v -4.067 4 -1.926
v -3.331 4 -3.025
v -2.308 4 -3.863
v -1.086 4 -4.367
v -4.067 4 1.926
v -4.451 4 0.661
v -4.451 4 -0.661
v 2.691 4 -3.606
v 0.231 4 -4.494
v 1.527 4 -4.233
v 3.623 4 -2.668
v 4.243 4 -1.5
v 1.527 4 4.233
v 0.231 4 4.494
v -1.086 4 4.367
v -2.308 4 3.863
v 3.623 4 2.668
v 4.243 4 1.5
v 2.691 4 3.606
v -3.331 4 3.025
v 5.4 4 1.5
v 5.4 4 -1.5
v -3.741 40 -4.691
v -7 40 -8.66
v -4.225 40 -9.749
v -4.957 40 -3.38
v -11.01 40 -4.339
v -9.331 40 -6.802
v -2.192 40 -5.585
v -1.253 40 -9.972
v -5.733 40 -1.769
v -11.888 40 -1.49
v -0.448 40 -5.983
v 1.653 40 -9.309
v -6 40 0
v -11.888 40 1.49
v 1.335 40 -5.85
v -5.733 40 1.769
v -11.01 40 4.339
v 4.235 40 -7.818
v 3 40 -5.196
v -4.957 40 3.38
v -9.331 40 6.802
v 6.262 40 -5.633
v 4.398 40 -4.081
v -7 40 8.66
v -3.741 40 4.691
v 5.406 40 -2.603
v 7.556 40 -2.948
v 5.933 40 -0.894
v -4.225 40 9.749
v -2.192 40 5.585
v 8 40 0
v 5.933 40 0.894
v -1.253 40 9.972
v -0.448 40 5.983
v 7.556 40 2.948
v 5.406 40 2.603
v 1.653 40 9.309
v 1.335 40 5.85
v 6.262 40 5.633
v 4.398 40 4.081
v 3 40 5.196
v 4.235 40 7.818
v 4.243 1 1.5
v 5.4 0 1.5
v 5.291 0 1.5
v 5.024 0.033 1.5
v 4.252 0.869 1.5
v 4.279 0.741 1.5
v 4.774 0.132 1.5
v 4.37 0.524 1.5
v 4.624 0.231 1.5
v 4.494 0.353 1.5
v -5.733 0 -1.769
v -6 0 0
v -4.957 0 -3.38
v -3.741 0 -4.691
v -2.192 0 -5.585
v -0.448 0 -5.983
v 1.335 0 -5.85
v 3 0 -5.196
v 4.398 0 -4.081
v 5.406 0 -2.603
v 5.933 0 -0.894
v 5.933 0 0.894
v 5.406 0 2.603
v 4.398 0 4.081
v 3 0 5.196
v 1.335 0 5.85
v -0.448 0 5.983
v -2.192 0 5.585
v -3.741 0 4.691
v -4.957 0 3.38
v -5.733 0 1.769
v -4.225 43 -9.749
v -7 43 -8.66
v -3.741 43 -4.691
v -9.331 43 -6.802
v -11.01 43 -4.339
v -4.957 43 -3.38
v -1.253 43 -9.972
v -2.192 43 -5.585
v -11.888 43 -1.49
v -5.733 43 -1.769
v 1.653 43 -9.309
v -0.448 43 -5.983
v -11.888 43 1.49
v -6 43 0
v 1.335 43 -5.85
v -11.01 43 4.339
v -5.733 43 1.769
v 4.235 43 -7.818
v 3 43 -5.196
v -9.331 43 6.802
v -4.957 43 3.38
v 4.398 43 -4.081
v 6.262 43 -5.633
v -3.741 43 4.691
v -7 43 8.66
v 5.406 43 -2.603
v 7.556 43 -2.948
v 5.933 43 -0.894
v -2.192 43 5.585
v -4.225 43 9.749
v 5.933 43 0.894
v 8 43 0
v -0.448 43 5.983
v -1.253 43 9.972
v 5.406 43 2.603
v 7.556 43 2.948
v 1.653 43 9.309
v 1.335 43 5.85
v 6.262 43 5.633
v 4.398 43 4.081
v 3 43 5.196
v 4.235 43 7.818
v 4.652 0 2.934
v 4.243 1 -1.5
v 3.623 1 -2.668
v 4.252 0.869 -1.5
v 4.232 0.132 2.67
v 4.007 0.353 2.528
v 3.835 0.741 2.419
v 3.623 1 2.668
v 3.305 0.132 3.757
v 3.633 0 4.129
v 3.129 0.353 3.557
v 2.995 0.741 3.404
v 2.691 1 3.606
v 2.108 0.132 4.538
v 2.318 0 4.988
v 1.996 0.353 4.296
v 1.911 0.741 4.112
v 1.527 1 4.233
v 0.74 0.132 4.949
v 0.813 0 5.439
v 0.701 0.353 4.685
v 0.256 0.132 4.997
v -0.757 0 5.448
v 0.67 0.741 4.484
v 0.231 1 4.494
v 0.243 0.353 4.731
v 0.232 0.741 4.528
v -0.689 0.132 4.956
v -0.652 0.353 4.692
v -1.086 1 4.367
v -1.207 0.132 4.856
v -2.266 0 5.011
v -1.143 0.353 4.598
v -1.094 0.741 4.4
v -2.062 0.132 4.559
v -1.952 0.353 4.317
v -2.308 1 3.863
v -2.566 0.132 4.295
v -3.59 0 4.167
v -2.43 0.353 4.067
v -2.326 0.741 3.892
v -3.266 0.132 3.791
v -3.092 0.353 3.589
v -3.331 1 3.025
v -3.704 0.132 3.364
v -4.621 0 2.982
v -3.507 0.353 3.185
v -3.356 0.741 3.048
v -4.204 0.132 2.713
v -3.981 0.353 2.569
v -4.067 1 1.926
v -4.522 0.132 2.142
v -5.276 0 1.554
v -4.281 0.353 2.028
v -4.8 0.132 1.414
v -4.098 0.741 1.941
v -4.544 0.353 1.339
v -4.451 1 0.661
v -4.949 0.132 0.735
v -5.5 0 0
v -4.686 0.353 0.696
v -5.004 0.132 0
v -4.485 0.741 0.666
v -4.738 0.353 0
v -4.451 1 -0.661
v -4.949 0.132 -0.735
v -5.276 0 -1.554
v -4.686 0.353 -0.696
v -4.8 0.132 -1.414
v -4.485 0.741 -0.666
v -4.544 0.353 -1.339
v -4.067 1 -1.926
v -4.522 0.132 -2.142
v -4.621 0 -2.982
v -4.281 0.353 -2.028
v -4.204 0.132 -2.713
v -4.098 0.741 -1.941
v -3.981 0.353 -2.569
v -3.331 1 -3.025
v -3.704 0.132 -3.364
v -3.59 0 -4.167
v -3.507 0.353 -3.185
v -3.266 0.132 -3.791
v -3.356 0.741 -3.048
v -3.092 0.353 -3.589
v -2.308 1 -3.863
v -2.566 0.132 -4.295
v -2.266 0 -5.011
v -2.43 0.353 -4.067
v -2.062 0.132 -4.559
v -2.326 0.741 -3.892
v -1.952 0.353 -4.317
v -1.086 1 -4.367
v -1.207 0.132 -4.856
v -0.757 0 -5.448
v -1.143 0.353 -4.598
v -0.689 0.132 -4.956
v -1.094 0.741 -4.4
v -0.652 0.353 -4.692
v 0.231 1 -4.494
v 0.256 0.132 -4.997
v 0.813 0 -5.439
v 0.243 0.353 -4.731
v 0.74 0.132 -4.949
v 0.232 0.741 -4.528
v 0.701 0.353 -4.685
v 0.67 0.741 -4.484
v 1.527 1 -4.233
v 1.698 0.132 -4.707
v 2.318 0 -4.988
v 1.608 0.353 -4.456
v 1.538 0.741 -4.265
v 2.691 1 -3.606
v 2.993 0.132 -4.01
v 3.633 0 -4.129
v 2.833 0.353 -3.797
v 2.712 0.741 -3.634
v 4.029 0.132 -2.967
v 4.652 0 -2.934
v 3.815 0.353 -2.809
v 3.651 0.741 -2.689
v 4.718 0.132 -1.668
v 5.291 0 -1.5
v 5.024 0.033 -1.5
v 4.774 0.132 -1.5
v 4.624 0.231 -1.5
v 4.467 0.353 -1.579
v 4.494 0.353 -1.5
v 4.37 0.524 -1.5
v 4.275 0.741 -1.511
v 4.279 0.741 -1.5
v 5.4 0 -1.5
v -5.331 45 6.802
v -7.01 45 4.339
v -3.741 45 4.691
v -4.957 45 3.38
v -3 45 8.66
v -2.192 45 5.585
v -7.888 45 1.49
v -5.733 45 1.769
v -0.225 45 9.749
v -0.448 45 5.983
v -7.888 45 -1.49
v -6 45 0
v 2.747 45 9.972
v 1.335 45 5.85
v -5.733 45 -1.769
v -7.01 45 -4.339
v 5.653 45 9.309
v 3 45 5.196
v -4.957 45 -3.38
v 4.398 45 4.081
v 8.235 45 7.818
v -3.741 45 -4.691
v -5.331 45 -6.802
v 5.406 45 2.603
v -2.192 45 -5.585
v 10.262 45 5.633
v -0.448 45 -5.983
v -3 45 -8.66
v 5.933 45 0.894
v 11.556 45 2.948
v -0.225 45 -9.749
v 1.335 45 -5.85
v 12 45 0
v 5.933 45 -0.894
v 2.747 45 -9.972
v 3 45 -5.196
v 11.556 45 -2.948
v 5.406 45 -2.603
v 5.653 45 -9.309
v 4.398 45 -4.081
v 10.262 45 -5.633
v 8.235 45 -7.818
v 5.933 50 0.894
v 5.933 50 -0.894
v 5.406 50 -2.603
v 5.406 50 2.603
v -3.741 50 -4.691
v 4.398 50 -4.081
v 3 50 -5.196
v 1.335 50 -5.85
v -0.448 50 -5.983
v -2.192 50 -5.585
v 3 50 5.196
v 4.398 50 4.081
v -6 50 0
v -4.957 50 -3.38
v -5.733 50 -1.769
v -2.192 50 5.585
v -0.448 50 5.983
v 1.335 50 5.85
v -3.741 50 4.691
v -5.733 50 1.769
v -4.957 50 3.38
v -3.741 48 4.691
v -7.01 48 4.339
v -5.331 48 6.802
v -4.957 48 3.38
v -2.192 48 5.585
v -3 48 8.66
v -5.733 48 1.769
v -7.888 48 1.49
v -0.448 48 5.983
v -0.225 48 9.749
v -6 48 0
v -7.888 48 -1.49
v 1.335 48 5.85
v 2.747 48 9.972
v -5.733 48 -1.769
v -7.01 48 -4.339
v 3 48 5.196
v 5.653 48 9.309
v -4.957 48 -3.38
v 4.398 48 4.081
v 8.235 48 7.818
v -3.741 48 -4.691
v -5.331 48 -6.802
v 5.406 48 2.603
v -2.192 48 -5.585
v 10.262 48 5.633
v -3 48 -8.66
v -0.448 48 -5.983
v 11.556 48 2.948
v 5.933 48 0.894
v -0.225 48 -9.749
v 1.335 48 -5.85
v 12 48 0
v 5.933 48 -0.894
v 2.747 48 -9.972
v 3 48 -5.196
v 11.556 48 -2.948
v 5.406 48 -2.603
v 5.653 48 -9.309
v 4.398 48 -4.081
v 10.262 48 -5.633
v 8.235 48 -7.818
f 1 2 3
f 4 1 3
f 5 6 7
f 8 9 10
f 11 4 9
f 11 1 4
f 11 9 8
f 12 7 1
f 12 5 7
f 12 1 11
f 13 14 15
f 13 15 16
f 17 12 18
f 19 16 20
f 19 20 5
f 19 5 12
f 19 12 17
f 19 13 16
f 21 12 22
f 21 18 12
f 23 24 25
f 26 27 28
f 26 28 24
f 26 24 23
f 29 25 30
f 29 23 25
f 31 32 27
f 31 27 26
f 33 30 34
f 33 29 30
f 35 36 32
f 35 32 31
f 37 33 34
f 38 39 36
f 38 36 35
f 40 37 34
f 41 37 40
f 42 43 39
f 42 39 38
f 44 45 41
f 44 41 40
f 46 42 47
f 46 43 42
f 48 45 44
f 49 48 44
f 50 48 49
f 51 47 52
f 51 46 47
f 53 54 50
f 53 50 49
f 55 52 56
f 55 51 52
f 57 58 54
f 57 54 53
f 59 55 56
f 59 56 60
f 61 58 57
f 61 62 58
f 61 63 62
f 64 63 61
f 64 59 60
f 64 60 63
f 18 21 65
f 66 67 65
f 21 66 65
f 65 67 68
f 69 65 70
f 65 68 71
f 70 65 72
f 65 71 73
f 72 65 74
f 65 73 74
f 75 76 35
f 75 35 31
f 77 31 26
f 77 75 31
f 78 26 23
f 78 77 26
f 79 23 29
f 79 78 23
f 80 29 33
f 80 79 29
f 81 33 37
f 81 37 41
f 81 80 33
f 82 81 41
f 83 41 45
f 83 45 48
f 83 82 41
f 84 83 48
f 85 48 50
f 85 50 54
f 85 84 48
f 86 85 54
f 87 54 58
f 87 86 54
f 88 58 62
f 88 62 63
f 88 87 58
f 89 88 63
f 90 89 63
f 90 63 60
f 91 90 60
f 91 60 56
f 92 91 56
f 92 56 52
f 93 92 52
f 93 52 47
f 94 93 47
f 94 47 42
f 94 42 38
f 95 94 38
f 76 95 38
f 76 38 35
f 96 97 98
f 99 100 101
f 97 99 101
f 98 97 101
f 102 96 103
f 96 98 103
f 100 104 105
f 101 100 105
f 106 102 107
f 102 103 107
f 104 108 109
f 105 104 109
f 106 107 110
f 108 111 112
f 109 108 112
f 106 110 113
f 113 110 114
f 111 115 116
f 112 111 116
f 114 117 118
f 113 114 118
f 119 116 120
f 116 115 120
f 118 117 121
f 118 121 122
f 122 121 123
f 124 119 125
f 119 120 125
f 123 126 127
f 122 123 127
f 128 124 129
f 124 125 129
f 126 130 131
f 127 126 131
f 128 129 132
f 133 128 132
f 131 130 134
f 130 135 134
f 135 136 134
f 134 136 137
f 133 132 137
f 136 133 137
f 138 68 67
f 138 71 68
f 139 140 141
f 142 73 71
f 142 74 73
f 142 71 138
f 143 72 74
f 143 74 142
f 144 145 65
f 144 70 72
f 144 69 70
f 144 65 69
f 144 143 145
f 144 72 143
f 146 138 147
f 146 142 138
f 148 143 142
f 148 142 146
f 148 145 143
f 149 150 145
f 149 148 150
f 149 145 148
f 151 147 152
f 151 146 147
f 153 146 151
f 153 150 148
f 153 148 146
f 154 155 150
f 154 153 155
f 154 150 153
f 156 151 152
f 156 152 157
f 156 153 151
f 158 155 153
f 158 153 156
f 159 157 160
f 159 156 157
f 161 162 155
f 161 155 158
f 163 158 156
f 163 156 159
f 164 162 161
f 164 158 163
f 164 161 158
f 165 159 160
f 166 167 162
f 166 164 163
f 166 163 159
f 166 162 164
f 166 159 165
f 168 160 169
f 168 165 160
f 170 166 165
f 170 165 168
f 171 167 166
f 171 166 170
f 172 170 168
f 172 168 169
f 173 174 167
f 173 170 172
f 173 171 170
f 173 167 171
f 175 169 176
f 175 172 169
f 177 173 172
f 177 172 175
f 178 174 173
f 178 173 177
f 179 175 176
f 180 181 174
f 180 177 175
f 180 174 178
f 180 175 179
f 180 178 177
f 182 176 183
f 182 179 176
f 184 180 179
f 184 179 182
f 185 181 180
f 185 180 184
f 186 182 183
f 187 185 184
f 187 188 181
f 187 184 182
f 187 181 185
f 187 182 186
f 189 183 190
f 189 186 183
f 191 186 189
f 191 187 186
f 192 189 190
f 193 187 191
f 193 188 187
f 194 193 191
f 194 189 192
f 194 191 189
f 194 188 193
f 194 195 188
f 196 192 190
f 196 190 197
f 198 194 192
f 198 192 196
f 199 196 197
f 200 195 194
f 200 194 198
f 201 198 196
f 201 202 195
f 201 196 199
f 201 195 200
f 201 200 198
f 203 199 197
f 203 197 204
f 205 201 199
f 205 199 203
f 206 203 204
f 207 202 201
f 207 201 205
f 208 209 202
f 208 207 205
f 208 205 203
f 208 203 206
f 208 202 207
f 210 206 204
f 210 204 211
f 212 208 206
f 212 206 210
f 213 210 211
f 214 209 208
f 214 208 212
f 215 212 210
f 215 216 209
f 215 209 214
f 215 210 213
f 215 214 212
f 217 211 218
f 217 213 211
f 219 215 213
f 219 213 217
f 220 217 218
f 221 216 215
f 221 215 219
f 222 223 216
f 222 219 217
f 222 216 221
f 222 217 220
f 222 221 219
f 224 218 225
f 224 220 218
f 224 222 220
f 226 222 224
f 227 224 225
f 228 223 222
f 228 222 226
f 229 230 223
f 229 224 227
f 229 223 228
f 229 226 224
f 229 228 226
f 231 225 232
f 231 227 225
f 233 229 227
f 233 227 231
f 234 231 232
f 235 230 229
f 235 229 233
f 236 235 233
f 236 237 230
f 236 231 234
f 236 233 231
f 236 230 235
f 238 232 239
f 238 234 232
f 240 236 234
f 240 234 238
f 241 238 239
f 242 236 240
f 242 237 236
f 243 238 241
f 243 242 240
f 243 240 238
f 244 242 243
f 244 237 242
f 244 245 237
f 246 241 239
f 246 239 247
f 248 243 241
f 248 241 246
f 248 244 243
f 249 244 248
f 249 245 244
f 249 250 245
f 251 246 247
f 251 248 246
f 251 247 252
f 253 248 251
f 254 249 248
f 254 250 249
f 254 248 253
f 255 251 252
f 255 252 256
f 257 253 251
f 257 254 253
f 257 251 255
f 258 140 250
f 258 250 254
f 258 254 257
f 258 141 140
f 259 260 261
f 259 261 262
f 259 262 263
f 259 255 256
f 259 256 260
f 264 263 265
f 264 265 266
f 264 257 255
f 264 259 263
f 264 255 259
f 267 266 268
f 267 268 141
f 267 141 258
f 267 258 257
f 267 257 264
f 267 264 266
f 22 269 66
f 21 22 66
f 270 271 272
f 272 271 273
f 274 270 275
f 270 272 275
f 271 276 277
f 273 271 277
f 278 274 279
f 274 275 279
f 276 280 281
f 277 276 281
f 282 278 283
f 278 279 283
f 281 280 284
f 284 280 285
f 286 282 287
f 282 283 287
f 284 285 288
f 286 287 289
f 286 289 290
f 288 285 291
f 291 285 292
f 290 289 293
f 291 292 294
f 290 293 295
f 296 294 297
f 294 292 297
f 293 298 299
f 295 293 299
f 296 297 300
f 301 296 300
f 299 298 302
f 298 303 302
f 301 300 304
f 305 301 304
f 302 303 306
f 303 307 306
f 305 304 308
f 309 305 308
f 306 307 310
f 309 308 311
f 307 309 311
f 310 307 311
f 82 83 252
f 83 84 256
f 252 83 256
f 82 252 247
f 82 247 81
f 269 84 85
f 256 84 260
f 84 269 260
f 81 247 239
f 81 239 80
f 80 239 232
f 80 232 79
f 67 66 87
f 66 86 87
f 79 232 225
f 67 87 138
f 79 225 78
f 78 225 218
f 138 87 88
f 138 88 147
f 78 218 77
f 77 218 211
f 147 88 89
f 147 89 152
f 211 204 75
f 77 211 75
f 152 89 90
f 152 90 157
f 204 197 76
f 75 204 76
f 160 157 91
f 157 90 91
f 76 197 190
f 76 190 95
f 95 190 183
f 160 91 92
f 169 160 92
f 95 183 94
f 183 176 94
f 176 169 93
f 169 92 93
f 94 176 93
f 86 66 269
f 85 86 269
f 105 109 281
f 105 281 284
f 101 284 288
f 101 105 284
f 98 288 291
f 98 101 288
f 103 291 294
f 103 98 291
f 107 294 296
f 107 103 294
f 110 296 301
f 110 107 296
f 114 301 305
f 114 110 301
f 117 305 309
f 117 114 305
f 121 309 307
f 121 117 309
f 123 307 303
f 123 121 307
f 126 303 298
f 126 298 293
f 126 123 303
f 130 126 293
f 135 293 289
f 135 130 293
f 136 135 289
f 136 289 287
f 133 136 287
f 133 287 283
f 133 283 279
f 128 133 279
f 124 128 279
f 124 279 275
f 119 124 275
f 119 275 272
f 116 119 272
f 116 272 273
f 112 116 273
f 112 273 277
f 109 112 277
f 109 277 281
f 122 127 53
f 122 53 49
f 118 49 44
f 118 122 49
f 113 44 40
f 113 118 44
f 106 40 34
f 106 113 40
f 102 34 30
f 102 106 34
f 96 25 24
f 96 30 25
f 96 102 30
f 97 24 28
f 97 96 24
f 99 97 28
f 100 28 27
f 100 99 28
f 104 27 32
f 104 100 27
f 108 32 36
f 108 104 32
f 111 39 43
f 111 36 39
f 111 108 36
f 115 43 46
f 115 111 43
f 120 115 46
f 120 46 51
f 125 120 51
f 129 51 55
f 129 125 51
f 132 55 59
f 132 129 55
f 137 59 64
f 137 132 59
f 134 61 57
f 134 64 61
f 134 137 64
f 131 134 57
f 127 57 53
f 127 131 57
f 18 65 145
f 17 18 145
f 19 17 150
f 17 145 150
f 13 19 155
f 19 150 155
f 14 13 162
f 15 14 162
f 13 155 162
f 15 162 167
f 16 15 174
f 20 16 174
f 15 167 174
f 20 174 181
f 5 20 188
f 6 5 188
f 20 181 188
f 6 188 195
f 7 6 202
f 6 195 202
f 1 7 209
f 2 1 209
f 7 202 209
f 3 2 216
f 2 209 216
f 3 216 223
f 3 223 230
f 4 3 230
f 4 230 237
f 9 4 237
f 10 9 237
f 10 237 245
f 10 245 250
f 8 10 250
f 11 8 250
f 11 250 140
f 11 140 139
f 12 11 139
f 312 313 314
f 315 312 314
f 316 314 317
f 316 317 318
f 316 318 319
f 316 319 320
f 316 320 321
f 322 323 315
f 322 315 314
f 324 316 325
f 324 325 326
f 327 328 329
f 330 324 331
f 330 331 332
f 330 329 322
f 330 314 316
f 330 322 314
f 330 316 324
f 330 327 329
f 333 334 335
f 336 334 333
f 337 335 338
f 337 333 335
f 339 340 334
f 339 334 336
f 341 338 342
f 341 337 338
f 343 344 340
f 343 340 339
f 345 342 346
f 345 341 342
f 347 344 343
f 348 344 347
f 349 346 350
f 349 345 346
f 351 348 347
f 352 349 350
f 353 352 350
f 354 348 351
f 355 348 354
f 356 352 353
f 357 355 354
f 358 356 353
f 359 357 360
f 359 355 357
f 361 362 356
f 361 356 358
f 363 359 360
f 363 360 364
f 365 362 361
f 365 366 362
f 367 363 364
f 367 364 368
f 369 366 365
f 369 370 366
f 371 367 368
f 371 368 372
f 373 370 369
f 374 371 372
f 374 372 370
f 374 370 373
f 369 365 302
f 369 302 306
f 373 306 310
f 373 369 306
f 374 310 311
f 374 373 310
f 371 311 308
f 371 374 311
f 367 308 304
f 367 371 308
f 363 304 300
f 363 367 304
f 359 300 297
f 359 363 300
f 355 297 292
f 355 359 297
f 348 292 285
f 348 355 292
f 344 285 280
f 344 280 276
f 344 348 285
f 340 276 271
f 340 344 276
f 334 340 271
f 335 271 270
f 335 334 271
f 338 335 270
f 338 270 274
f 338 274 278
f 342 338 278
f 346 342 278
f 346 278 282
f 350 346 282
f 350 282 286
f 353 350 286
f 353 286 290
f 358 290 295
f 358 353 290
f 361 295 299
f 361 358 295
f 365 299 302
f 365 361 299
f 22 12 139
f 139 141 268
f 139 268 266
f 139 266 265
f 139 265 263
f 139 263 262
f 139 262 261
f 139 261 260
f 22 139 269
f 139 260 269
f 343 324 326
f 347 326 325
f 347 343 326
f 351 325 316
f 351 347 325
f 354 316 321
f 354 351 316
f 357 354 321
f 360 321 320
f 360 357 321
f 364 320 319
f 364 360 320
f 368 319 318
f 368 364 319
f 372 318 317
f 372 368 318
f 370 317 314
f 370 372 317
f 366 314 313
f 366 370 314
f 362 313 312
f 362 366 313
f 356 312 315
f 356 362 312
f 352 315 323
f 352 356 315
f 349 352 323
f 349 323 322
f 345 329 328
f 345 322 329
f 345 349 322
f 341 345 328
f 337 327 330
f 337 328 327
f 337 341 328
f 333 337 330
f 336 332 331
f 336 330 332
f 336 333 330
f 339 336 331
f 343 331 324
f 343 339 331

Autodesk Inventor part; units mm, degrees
ref_plane "YZ Plane" through (0, 0, 0) normal (1, 0, 0) x (0, 1, 0)
ref_plane "XZ Plane" through (0, 0, 0) normal (0, 1, 0) x (-1, 0, 0)
ref_plane "XY Plane" through (0, 0, 0) normal (0, 0, 1) x (1, 0, 0)
sketch "Sketch1" plane through (0, 0, 0) normal (0, 1, 0) x (-1, 0, 0)
  point P0 (0, 0)
sketch "Sketch2" plane through (0, 0, 0) normal (0, 1, 0) x (-1, 0, 0)
  circle A0 centre (0, 0) radius 6
  dimension "d20" = 12
extrude "Extrusion1" add sketch "Sketch2" along normal blind 50
ref_plane "Work Plane1" through (0, 48, 0) normal (0, 1, 0) x (1, 0, 0)
sketch "Sketch3" plane through (0, 48, 0) normal (0, 1, 0) x (1, 0, 0)
  line L0 (0, 0) -> (2, 0)
  circle A0 centre (2, 0) radius 10
  dimension "d4" = 2
  dimension "d5" = 20
extrude "Extrusion2" add sketch "Sketch3" against normal blind 3
ref_plane "Work Plane2" through (2, 43, 0) normal (0, -1, 0) x (1, 0, 0)
sketch "Sketch5" plane through (2, 43, 0) normal (0, -1, 0) x (1, 0, 0)
  line L0 (-2, 0) -> (-4, 0)
  circle A0 centre (-4, 0) radius 10
  dimension "d16" = 2
  dimension "d17" = 20
extrude "Extrusion4" add sketch "Sketch5" along normal blind 3
sketch "Sketch6" plane through (0, 0, 0) normal (0, -1, 0) x (1, 0, 0)
  circle A0 centre (0, 0) radius 3.5
  arc A1 (4.2426, 1.5) -> (4.2426, -1.5) centre (0, 0) ccw
  line L0 (5.4, 1.5) -> (4.2426, 1.5)
  line L1 (4.2426, -1.5) -> (5.4, -1.5)
  line L2 (5.4, -1.5) -> (5.4, 1.5)
  point P0 (0, 0)
  point P1 (0, 0)
extrude "Extrusion5" cut sketch "Sketch6" against normal blind 4 contours A0 | L0 L2 L1 A1
fillet "Fillet1" radius 1 1 edges at (-4.5, 0, 0)
properties part number "input_shaft"
